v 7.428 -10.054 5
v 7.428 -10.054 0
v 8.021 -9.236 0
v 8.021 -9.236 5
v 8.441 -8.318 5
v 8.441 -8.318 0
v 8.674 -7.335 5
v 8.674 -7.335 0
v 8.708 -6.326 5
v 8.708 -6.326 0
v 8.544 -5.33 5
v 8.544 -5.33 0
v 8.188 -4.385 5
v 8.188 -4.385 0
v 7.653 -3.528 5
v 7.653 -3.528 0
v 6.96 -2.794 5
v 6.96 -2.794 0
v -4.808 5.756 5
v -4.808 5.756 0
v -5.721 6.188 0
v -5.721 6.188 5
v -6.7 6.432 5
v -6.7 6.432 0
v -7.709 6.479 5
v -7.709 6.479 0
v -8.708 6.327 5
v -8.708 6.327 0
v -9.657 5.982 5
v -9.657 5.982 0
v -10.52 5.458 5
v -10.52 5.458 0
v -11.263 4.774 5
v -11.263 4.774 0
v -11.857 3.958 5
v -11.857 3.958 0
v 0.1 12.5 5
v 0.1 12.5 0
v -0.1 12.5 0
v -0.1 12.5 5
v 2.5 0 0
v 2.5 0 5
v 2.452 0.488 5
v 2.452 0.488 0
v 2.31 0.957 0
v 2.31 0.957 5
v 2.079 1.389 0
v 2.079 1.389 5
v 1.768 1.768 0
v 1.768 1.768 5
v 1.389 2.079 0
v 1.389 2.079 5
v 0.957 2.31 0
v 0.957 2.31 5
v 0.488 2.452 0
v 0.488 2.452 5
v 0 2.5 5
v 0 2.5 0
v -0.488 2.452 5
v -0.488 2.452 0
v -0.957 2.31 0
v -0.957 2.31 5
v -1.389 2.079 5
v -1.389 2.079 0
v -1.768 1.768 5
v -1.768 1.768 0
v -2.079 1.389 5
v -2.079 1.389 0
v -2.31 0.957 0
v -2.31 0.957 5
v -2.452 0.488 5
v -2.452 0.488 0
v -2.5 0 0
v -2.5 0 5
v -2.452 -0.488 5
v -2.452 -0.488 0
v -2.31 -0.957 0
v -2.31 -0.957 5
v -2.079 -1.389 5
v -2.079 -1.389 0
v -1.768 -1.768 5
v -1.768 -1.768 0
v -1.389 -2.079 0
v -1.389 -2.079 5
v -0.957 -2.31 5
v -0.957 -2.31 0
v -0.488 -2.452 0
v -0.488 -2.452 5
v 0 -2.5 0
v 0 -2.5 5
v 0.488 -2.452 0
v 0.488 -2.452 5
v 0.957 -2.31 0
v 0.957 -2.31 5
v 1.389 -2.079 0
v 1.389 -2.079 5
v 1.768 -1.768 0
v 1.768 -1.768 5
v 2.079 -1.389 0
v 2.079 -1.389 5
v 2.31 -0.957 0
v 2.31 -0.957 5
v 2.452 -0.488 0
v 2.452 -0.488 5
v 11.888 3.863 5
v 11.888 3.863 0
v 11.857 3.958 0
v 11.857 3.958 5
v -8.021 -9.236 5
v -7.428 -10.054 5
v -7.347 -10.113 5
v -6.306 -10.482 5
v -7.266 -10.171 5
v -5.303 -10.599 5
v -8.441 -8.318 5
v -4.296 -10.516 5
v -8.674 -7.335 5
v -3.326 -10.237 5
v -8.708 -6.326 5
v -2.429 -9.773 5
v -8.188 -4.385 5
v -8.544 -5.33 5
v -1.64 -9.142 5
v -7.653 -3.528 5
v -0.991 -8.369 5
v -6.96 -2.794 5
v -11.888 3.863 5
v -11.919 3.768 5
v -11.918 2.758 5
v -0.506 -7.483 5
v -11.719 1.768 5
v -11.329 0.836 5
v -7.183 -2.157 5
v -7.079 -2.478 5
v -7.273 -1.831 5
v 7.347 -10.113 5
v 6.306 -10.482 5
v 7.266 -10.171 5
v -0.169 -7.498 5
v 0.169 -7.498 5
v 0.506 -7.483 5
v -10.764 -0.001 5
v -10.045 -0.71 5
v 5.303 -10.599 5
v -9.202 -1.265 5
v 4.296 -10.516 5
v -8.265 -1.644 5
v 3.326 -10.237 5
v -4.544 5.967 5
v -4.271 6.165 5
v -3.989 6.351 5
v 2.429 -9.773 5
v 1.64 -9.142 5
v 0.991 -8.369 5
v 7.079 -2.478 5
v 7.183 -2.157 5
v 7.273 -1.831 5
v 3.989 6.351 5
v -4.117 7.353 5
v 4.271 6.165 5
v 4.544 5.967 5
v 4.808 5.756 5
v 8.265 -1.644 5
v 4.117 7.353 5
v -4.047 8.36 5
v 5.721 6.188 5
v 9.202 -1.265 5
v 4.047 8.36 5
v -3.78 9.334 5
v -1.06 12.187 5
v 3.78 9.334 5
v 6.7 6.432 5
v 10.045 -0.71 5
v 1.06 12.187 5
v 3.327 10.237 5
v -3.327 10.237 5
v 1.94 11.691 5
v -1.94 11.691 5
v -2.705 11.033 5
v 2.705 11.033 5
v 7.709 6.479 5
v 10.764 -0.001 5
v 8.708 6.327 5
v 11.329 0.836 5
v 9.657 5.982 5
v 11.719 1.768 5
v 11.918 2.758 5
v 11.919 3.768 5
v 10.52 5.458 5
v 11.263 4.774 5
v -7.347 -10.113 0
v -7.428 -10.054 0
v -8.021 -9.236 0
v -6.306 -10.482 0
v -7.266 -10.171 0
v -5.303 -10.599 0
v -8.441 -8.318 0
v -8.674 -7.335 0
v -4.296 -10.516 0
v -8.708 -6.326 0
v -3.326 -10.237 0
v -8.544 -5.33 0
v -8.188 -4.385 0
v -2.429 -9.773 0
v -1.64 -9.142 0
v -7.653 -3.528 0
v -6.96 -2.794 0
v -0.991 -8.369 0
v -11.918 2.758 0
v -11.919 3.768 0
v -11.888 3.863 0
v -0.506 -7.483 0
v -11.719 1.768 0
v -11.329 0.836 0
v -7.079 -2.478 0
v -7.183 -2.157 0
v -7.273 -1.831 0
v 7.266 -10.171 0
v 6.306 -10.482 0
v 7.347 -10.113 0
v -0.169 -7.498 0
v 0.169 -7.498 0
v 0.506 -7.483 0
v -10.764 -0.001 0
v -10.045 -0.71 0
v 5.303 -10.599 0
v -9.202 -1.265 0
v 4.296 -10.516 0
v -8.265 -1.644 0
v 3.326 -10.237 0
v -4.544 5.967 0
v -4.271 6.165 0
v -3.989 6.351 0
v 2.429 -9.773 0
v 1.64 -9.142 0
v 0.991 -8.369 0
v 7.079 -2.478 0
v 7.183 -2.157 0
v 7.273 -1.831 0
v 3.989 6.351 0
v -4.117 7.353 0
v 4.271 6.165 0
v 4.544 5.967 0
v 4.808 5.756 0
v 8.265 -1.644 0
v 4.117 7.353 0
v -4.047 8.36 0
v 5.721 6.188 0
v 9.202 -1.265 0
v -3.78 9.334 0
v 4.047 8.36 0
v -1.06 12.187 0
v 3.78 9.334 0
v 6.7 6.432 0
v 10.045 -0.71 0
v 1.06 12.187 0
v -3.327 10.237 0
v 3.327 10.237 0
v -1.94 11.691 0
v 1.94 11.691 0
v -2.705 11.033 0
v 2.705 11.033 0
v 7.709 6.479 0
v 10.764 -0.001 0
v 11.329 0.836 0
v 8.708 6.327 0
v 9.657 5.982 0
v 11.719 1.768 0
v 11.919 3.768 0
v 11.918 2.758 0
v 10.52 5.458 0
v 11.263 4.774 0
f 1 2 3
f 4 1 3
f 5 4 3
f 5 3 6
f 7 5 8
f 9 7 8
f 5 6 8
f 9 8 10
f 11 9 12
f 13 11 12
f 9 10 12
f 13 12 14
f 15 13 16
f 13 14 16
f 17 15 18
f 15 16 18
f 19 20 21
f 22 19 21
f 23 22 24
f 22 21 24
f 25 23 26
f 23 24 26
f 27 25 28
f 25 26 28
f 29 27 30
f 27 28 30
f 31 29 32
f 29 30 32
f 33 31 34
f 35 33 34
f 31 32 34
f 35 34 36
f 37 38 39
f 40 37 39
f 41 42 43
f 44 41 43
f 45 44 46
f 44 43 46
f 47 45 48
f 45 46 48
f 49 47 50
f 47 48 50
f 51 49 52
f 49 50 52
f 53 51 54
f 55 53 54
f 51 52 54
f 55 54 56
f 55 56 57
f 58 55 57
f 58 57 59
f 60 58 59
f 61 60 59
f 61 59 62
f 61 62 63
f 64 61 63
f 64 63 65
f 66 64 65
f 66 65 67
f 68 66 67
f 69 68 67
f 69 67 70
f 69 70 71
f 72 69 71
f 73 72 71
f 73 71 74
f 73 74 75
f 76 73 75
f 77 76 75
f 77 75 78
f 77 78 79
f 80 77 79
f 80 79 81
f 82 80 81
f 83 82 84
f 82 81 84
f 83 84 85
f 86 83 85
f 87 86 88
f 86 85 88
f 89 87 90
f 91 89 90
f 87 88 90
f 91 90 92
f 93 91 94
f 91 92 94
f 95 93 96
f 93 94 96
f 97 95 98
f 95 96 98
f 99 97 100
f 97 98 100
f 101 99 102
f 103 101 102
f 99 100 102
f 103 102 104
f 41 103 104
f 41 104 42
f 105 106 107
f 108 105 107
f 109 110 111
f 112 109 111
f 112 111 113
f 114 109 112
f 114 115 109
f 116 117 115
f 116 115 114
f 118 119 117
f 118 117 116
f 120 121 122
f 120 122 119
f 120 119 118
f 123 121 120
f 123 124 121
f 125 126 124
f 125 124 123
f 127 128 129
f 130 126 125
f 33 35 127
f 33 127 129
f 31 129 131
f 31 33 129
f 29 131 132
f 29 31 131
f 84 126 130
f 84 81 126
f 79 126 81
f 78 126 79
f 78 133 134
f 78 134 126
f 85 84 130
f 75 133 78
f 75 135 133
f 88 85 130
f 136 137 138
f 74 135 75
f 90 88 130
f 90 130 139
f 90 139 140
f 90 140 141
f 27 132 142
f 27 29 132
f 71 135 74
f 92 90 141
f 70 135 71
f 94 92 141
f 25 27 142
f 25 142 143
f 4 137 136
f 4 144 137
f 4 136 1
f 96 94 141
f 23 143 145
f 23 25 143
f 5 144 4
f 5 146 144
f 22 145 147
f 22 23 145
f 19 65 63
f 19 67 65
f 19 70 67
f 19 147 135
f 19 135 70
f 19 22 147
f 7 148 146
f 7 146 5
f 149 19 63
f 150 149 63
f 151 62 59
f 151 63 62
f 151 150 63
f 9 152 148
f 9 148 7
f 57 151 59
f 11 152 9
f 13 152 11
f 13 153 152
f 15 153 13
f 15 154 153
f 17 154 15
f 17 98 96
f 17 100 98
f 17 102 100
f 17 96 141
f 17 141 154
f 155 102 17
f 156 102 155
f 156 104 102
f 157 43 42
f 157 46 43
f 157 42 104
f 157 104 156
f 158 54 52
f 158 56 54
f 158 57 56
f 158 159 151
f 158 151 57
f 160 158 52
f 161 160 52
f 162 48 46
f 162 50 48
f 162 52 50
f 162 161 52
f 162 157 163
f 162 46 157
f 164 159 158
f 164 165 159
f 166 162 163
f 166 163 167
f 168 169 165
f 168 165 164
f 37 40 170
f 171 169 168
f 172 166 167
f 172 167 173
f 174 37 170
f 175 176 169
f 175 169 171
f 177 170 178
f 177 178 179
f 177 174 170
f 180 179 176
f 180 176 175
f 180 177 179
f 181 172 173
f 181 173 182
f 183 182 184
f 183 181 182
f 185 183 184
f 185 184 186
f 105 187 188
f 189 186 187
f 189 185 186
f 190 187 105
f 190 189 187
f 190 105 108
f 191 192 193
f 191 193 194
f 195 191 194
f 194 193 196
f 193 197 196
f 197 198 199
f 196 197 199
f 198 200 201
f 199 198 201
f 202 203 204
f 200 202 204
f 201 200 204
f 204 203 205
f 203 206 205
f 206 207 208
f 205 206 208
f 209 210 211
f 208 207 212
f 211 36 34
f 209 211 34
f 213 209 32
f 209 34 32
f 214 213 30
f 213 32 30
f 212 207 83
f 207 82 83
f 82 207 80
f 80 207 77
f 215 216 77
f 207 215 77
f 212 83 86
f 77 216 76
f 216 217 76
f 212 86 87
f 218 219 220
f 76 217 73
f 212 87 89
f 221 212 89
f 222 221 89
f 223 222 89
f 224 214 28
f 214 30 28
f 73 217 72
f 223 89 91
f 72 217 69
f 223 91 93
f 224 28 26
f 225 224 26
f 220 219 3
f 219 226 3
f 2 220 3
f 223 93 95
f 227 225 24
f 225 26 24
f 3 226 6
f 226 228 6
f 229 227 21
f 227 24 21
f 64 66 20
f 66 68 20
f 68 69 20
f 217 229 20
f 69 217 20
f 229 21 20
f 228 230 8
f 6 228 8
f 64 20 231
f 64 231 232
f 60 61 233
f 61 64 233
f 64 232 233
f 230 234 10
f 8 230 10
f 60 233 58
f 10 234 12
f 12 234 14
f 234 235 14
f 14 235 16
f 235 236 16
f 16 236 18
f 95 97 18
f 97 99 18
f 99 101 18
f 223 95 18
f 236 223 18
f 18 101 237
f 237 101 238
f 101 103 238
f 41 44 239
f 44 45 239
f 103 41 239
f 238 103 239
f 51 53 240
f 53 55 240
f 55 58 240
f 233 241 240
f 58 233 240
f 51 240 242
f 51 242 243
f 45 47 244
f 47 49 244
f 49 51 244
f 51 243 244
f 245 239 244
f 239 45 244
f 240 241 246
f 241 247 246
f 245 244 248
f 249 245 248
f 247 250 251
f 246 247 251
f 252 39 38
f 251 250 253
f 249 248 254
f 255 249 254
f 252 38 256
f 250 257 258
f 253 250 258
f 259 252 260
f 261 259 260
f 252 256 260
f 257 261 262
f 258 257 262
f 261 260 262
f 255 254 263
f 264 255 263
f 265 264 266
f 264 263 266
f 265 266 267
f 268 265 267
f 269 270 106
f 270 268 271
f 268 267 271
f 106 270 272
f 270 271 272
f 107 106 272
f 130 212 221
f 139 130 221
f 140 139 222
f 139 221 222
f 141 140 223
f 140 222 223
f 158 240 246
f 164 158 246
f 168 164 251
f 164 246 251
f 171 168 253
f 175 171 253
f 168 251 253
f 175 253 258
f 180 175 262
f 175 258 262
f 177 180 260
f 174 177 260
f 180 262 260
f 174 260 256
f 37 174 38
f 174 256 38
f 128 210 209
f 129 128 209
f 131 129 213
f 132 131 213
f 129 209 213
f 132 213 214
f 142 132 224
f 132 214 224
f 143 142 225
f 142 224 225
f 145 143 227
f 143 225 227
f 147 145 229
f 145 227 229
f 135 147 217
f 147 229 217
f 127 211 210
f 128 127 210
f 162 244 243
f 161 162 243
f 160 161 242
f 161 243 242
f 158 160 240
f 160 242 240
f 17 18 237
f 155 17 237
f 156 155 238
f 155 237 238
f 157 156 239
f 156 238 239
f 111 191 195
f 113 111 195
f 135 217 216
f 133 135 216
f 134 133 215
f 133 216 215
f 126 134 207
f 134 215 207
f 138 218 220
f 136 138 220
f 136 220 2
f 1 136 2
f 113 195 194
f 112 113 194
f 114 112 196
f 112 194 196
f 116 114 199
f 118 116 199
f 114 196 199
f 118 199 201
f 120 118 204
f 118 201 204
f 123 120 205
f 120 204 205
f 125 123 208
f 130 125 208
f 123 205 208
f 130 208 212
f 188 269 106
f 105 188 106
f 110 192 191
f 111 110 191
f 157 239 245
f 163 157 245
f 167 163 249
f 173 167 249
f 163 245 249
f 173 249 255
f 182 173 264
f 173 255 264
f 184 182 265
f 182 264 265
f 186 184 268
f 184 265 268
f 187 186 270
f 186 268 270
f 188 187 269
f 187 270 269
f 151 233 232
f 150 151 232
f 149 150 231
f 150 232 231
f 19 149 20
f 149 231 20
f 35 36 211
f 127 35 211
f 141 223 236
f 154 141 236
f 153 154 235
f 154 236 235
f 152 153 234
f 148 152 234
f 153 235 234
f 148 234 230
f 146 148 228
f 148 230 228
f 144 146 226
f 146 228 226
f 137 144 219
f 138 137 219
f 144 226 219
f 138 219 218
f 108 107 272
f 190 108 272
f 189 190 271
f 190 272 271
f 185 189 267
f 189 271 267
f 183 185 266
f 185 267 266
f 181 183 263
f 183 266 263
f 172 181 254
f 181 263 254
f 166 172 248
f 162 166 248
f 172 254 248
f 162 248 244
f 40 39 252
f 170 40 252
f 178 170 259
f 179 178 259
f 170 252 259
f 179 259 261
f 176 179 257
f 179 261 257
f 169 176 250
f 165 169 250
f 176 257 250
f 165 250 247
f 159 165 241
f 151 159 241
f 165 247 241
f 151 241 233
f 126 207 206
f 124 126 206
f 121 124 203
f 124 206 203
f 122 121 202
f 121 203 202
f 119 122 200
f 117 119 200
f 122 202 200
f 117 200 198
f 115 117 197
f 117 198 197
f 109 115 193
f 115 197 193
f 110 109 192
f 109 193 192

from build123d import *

# Parameters (mm, degrees)
F1_DEPTH = 5
F2_R     = 2.5
F3_DEPTH = 5.001


with BuildPart() as f1:
    # F0 (on Top) → F1 (new body)
    with BuildSketch(Plane.XY):
        with BuildLine():
            ThreePointArc((7.273025, -1.831149), (7.44304, -0.922581), (7.5, 0))
            ThreePointArc((7.5, 0), (6.793658, 3.177453), (4.807679, 5.756407))
            ThreePointArc((4.807679, 5.756407), (4.408389, 6.067627), (3.989014, 6.351202))
            ThreePointArc((3.989014, 6.351202), (0, 7.5), (-3.989014, 6.351202))
            ThreePointArc((-3.989014, 6.351202), (-4.408389, 6.067627), (-4.807679, 5.756407))
            ThreePointArc((-4.807679, 5.756407), (-7.132924, 2.317627), (-7.273025, -1.831149))
            ThreePointArc((-7.273025, -1.831149), (-7.132924, -2.317627), (-6.960323, -2.793547))
            ThreePointArc((-6.960323, -2.793547), (-4.408389, -6.067627), (-0.505963, -7.482914))
            ThreePointArc((-0.505963, -7.482914), (0, -7.5), (0.505963, -7.482914))
            ThreePointArc((0.505963, -7.482914), (4.408389, -6.067627), (6.960323, -2.793547))
            ThreePointArc((6.960323, -2.793547), (7.132924, -2.317627), (7.273025, -1.831149))
        make_face()
        with BuildLine():
            ThreePointArc((4.807679, 5.756407), (6.793658, 3.177453), (7.5, 0))
            ThreePointArc((7.5, 0), (7.44304, -0.922581), (7.273025, -1.831149))
            ThreePointArc((7.273025, -1.831149), (10.763626, -0.000661), (11.919108, 3.767607))
            Line((11.919108, 3.767607), (11.888206, 3.862712))
            Line((11.888206, 3.862712), (11.857305, 3.957818))
            ThreePointArc((11.857305, 3.957818), (8.707568, 6.327235), (4.807679, 5.756407))
        make_face()
        with BuildLine():
            ThreePointArc((-3.989014, 6.351202), (0, 7.5), (3.989014, 6.351202))
            ThreePointArc((3.989014, 6.351202), (3.326772, 10.236612), (0.1, 12.5))
            Line((0.1, 12.5), (0, 12.5))
            Line((0, 12.5), (-0.1, 12.5))
            ThreePointArc((-0.1, 12.5), (-3.326772, 10.236612), (-3.989014, 6.351202))
        make_face()
        with BuildLine():
            ThreePointArc((7.428217, -10.053934), (8.708345, -6.326166), (6.960323, -2.793547))
            ThreePointArc((6.960323, -2.793547), (4.408389, -6.067627), (0.505963, -7.482914))
            ThreePointArc((0.505963, -7.482914), (3.325515, -10.237021), (7.266414, -10.171491))
            Line((7.266414, -10.171491), (7.347316, -10.112712))
            Line((7.347316, -10.112712), (7.428217, -10.053934))
        make_face()
        with BuildLine():
            ThreePointArc((-7.273025, -1.831149), (-7.132924, 2.317627), (-4.807679, 5.756407))
            ThreePointArc((-4.807679, 5.756407), (-8.707568, 6.327235), (-11.857305, 3.957818))
            Line((-11.857305, 3.957818), (-11.888206, 3.862712))
            Line((-11.888206, 3.862712), (-11.919108, 3.767607))
            ThreePointArc((-11.919108, 3.767607), (-10.763626, -0.000661), (-7.273025, -1.831149))
        make_face()
        with BuildLine():
            ThreePointArc((-7.266414, -10.171491), (-3.325515, -10.237021), (-0.505963, -7.482914))
            ThreePointArc((-0.505963, -7.482914), (-4.408389, -6.067627), (-6.960323, -2.793547))
            ThreePointArc((-6.960323, -2.793547), (-8.708345, -6.326166), (-7.428217, -10.053934))
            Line((-7.428217, -10.053934), (-7.347316, -10.112712))
            Line((-7.347316, -10.112712), (-7.266414, -10.171491))
        make_face()
    extrude(amount=F1_DEPTH)

    # F2 (on face) → F3 (cut, through all)
    with BuildSketch(Plane.XY.offset(5)):
        Circle(F2_R)
    extrude(amount=-F3_DEPTH, mode=Mode.SUBTRACT)


solid = f1.part
